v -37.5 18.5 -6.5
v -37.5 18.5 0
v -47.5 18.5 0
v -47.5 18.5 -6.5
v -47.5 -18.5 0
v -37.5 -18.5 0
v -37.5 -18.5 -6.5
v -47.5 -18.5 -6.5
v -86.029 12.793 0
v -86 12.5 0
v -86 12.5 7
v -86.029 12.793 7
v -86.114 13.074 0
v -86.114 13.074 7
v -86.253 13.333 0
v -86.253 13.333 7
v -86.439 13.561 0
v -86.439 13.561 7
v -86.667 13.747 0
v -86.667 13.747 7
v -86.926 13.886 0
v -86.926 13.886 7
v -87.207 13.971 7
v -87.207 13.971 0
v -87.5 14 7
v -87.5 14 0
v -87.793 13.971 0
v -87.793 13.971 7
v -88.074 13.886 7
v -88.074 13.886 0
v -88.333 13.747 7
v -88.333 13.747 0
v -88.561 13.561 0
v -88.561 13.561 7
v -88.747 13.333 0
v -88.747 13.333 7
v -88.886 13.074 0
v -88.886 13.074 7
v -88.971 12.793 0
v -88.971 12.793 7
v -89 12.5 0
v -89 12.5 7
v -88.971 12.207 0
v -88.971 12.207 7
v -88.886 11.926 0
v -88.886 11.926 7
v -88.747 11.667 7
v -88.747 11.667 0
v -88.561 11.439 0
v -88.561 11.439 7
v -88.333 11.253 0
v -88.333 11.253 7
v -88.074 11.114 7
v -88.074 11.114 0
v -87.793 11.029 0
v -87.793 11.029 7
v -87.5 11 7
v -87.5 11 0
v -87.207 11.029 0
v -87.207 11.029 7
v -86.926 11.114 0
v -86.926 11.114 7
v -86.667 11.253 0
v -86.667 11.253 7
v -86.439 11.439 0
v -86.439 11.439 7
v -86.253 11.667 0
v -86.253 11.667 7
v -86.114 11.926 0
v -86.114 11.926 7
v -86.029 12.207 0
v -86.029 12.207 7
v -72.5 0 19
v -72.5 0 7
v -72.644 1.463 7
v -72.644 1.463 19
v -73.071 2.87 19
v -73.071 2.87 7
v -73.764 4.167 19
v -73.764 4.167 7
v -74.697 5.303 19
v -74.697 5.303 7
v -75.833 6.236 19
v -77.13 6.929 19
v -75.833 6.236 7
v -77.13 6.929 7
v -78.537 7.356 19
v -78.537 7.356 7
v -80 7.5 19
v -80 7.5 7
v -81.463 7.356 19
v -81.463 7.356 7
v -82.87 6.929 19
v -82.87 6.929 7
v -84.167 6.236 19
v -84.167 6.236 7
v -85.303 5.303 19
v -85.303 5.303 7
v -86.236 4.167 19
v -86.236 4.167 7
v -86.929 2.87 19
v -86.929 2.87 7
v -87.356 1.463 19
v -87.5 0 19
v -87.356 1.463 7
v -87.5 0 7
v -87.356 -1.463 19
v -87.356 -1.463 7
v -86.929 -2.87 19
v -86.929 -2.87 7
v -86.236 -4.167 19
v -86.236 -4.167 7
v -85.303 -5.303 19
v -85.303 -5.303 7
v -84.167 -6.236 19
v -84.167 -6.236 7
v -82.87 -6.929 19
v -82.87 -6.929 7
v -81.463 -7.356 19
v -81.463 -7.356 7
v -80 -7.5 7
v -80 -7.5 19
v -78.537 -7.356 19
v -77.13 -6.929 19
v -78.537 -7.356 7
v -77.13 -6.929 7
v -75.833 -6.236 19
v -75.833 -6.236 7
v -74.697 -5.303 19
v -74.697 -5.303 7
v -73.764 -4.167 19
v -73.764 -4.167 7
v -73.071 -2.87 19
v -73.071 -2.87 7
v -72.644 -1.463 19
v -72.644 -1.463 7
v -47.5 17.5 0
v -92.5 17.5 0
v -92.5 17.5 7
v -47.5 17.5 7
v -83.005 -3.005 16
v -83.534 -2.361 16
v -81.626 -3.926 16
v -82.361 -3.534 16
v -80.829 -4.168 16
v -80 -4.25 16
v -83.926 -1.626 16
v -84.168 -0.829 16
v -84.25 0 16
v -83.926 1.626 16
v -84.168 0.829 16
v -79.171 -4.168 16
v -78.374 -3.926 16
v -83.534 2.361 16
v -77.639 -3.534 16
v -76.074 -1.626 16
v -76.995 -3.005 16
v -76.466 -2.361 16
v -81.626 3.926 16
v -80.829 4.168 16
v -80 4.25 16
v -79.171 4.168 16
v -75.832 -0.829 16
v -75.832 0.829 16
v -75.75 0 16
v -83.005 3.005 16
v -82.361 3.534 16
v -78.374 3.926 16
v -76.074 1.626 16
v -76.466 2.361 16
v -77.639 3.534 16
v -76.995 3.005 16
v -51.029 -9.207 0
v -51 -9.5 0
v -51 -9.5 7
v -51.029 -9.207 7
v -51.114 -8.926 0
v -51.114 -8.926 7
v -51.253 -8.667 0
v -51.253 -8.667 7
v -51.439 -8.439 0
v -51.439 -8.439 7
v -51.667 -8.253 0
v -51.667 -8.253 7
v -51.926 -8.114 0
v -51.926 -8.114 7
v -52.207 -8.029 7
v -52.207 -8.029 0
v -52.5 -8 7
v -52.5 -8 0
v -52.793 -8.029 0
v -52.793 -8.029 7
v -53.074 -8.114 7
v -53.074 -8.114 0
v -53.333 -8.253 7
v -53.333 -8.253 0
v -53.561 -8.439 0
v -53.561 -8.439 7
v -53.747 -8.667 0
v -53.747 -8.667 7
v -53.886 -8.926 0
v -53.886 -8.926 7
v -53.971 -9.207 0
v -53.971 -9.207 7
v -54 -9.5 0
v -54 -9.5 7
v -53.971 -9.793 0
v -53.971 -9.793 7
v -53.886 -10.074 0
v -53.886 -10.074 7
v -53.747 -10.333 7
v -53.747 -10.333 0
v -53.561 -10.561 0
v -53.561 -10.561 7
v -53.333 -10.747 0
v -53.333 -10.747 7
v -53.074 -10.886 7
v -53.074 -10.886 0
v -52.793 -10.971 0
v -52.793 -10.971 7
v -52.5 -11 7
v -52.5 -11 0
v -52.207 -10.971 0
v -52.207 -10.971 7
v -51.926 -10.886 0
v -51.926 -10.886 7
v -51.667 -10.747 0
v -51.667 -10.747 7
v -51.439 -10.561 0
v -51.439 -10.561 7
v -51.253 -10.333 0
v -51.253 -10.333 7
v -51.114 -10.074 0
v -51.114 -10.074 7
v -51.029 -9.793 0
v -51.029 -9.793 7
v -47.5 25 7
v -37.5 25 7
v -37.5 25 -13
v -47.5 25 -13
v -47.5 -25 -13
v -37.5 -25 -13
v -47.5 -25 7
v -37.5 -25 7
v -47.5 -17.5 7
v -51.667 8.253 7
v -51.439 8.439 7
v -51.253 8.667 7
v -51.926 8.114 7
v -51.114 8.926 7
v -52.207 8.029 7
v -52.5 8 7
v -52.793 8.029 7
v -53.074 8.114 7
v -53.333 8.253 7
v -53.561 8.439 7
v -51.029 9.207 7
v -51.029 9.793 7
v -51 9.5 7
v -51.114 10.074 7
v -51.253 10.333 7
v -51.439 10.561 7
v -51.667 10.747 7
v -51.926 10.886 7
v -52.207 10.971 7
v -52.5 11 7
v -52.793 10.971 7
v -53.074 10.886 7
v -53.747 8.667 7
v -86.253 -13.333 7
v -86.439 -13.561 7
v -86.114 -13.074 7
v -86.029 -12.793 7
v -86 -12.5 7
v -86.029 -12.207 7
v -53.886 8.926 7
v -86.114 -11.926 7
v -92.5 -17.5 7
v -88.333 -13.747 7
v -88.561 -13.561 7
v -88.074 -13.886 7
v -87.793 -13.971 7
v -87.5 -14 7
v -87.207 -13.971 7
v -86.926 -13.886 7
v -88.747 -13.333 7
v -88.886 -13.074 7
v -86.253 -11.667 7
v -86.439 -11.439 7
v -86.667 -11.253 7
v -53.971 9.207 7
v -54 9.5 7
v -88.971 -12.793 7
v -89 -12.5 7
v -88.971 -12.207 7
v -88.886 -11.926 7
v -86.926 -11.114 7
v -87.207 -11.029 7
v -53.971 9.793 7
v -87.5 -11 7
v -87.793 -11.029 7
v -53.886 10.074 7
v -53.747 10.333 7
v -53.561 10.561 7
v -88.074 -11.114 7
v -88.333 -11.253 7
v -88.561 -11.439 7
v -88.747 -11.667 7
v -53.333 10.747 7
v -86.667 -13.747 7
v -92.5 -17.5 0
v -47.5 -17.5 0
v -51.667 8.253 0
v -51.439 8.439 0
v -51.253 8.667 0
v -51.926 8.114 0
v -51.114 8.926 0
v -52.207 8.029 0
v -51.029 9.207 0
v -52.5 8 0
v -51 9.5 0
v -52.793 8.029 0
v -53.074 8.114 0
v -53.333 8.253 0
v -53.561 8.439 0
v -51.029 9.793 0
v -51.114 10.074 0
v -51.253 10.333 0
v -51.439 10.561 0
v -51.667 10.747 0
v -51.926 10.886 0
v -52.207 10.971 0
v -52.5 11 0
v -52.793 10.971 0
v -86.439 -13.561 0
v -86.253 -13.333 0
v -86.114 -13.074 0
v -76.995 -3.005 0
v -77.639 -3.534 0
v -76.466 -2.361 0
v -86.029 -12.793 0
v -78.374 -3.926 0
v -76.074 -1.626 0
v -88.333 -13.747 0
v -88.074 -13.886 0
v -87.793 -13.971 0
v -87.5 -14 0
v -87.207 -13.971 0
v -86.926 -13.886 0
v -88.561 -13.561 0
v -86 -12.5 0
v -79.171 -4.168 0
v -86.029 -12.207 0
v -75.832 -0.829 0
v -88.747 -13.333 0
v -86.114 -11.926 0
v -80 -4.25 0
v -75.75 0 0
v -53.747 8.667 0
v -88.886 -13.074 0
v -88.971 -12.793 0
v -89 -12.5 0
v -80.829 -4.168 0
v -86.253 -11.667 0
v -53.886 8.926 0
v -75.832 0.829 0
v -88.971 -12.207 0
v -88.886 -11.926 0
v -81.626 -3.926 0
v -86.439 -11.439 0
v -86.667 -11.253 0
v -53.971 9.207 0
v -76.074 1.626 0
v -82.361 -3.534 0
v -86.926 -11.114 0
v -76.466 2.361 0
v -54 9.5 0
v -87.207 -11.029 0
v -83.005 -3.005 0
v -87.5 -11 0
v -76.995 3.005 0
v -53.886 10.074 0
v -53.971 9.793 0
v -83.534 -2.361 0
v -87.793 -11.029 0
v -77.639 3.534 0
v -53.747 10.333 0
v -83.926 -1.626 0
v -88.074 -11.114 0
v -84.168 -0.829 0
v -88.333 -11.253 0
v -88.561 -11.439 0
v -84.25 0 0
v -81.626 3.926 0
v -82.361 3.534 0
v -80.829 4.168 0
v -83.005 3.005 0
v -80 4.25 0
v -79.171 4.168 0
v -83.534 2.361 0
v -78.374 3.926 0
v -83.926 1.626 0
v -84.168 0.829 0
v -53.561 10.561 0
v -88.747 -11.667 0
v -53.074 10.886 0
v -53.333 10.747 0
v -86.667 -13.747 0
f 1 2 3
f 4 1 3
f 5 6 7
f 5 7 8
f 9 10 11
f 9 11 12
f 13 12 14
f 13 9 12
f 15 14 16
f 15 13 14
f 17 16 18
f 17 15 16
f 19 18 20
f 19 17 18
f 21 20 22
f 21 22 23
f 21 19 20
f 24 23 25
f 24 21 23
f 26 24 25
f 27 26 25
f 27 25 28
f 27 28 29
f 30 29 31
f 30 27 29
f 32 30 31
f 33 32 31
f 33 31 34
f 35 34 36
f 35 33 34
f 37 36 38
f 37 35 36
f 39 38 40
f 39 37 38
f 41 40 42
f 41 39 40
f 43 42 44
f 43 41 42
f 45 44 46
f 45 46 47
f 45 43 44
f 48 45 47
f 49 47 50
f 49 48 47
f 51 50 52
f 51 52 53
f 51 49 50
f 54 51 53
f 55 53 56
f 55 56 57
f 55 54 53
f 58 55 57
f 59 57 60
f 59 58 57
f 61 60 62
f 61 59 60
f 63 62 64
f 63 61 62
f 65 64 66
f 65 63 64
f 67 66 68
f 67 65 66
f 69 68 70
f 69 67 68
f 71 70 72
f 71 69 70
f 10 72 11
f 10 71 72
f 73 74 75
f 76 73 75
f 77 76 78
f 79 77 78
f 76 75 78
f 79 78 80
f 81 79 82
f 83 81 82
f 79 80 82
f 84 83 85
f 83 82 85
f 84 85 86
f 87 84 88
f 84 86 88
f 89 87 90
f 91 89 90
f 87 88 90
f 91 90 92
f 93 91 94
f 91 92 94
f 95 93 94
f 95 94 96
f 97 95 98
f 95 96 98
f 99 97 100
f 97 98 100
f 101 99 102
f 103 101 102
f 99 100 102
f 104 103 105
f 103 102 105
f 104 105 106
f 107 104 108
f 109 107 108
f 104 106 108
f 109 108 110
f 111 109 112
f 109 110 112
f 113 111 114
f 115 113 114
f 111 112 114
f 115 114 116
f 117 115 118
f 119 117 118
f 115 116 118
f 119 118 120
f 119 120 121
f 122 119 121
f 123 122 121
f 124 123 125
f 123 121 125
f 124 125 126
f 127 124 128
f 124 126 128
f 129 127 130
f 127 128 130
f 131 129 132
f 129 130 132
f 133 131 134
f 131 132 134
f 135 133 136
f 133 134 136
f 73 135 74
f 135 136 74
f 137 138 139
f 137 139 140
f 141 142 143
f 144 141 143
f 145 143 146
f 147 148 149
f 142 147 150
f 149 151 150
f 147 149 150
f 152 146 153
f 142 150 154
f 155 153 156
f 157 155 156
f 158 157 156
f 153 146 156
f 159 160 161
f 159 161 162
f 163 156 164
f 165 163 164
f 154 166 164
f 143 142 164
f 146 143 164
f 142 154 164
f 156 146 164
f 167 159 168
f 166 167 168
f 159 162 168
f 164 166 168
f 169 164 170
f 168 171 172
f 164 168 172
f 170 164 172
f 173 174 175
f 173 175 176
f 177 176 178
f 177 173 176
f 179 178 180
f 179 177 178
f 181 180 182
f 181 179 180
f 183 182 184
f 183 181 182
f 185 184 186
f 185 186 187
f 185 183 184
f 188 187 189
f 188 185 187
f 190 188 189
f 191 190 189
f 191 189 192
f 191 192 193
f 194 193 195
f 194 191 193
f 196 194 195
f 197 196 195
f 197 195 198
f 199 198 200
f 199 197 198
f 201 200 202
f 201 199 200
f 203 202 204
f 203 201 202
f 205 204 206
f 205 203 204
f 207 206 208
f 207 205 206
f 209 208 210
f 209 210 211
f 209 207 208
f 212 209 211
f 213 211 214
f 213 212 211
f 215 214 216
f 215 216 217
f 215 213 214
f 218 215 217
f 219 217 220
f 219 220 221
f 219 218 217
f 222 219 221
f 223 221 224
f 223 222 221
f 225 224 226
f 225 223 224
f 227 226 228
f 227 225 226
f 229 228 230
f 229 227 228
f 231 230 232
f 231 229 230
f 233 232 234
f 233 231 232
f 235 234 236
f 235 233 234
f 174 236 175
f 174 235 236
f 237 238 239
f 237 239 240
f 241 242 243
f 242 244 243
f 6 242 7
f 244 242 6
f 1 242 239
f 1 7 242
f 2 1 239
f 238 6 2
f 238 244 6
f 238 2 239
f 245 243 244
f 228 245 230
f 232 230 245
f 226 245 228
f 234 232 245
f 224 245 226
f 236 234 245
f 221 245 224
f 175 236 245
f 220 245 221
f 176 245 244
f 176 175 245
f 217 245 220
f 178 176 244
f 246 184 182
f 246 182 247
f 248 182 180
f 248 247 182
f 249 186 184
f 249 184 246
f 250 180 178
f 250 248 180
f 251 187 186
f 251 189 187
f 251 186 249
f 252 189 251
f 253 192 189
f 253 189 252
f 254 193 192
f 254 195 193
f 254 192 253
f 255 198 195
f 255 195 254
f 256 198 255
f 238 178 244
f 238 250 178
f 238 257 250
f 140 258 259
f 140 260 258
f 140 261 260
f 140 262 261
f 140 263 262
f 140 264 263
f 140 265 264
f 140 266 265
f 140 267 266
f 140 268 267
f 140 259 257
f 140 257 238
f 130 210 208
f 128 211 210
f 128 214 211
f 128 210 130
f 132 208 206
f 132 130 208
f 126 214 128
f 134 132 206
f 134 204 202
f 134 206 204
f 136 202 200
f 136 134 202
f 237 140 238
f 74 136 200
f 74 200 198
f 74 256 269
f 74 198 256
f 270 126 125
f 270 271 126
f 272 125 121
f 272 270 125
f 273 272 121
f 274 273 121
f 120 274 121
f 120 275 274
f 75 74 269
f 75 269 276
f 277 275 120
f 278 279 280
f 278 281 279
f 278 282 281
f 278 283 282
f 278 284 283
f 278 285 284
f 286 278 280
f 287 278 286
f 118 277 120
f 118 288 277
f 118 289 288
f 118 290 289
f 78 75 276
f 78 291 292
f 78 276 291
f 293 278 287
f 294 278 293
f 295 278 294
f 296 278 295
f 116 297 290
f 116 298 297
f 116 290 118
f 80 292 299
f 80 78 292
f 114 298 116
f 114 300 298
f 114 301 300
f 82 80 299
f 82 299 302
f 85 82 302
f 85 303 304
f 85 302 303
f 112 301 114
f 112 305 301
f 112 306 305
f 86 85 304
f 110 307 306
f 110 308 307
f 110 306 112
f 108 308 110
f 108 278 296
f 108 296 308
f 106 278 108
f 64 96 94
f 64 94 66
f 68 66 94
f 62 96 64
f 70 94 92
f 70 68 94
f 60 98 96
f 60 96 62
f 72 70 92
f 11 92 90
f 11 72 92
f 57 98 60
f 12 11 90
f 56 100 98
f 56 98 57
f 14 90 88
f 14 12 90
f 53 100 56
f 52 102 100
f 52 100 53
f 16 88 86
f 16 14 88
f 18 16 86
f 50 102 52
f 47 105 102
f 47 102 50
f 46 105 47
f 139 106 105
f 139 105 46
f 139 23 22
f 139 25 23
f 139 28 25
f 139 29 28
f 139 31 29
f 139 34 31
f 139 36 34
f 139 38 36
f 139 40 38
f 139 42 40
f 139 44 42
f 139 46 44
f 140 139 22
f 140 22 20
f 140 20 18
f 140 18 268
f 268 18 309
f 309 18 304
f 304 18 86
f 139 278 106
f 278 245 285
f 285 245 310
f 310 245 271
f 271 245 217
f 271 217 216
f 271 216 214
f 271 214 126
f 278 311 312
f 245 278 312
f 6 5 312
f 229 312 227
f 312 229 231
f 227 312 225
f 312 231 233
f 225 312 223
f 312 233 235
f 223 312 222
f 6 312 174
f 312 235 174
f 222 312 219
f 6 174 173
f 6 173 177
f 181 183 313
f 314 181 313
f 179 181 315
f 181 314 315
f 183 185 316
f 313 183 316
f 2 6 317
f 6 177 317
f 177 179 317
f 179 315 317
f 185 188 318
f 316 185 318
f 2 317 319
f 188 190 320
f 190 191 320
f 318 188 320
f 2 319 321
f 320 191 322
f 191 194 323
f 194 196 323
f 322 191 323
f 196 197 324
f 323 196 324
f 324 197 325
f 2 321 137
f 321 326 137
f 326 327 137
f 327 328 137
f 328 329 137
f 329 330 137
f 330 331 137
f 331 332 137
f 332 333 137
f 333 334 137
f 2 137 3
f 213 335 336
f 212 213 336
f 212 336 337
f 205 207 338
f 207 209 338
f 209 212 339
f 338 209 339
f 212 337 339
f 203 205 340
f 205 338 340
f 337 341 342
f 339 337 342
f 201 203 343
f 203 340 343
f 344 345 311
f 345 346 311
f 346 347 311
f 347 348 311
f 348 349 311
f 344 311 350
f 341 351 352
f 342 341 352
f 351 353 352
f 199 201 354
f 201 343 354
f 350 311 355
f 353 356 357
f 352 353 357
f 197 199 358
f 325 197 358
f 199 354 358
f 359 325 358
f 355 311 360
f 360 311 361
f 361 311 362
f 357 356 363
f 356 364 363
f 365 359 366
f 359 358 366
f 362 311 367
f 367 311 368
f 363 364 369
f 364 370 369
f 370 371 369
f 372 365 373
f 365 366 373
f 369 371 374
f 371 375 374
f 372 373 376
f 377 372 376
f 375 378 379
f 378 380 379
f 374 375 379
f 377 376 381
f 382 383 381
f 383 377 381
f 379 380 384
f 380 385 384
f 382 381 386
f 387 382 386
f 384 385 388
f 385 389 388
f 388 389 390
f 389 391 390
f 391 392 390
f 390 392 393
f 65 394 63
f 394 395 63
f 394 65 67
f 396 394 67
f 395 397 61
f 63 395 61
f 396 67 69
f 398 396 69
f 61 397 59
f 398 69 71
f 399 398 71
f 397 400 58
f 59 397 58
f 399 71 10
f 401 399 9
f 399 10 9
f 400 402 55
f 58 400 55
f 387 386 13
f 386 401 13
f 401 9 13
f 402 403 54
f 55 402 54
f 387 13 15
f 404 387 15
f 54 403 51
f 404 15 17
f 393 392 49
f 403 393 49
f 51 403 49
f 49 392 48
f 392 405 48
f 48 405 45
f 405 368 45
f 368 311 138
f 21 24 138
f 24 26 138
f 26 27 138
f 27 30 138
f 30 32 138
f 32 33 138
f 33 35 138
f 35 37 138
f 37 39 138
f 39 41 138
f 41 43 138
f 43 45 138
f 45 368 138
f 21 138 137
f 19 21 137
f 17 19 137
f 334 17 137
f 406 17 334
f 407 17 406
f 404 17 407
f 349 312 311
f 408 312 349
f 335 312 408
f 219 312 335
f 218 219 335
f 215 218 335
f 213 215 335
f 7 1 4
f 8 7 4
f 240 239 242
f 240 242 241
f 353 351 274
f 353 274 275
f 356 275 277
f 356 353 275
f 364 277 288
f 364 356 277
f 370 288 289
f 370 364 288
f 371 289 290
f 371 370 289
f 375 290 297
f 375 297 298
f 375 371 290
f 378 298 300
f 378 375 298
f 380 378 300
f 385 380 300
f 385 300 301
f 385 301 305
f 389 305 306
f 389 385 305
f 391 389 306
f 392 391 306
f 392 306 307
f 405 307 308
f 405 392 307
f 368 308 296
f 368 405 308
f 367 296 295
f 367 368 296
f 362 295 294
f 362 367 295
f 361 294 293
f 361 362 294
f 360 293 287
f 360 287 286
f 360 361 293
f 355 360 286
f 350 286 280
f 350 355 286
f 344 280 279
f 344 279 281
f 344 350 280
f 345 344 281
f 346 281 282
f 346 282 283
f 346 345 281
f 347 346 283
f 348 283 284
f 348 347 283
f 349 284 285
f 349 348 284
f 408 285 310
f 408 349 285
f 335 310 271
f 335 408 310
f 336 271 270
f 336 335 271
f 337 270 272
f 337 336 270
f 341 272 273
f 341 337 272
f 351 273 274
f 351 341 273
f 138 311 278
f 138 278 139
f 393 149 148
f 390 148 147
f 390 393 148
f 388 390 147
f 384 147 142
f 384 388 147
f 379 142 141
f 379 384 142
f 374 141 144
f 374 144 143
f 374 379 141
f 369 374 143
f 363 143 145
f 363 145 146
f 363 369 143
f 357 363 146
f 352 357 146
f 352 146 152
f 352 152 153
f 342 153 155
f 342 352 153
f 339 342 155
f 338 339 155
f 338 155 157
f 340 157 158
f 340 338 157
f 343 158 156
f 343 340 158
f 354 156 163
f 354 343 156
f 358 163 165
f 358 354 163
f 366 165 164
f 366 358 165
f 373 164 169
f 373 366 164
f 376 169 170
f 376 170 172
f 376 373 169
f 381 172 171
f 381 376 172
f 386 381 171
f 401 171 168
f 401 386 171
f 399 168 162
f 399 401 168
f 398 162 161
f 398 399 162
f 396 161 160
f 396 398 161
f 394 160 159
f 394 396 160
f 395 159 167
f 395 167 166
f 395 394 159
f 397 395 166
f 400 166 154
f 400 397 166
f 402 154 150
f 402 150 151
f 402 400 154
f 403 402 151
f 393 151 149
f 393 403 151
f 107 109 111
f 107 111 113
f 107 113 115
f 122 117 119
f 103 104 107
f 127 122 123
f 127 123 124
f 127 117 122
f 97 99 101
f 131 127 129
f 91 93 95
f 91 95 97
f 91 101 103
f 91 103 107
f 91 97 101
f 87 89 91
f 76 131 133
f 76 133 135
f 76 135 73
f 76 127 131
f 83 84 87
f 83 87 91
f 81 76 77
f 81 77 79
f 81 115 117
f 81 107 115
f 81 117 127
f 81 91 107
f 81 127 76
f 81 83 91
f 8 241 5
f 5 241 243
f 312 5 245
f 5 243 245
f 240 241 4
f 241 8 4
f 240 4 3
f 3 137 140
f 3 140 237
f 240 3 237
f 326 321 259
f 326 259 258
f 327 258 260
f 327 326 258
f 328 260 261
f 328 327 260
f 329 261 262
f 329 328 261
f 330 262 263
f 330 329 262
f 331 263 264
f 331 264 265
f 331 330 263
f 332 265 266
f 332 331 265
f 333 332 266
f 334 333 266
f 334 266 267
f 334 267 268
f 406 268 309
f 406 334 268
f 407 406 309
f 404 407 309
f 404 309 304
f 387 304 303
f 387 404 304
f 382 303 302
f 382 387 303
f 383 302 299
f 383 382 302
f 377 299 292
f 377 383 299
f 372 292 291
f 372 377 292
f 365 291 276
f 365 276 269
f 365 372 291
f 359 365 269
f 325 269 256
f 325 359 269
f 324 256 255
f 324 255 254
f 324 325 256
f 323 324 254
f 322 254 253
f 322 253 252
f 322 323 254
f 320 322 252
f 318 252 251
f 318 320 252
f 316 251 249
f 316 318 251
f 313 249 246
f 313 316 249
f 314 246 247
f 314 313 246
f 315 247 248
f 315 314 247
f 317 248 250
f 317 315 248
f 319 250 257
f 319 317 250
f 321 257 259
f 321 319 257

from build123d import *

# Parameters (mm, degrees)
SKETCH1_R           = 1.5
BOSS_EXTRUDE1_DEPTH = 7
SKETCH2_W           = 7
SKETCH2_H           = 50
BOSS_EXTRUDE2_DEPTH = 10
SKETCH3_W           = 10
SKETCH3_H           = 6.5
BOSS_EXTRUDE3_DEPTH = 6.5
SKETCH4_W           = 10
SKETCH4_H           = 50
BOSS_EXTRUDE4_DEPTH = 6.5
SKETCH5_R           = 7.5
BOSS_EXTRUDE5_DEPTH = 12
SKETCH1_3_R         = 4.25
CUT_EXTRUDE1_DEPTH  = 16


with BuildPart() as part:
    # Sketch1 → Boss-Extrude1 (new body)
    with BuildSketch(Plane.XY):
        Polygon((-47.5, 17.5), (-92.5, 17.5), (-92.5, 0), (-92.5, -17.5), (-47.5, -17.5), align=None)
        with Locations((-87.5, -12.5)):
            Circle(SKETCH1_R, mode=Mode.SUBTRACT)
        with Locations((-52.5, -9.5)):
            Circle(SKETCH1_R, mode=Mode.SUBTRACT)
        with Locations((-87.5, 12.5)):
            Circle(SKETCH1_R, mode=Mode.SUBTRACT)
        with Locations((-52.5, 9.5)):
            Circle(SKETCH1_R, mode=Mode.SUBTRACT)
    extrude(amount=BOSS_EXTRUDE1_DEPTH)

    # Sketch2 → Boss-Extrude2 (add)
    with BuildSketch(Plane(origin=(-47.5, 0, 0), x_dir=(0, 0, -1), z_dir=(1, 0, 0))):
        with Locations((-3.5, 0)):
            Rectangle(SKETCH2_W, SKETCH2_H)
    extrude(amount=BOSS_EXTRUDE2_DEPTH)

    # Sketch3 → Boss-Extrude3 (add)
    with BuildSketch(Plane(origin=(0, 0, 0), x_dir=(-1, 0, 0), z_dir=(0, 0, -1))):
        with Locations((42.5, 21.75)):
            Rectangle(SKETCH3_W, SKETCH3_H)
        with Locations((42.5, -21.75)):
            Rectangle(SKETCH3_W, SKETCH3_H)
    extrude(amount=BOSS_EXTRUDE3_DEPTH)

    # Sketch4 → Boss-Extrude4 (add)
    with BuildSketch(Plane(origin=(0, 0, -6.5), x_dir=(-1, 0, 0), z_dir=(0, 0, -1))):
        with Locations((42.5, 0)):
            Rectangle(SKETCH4_W, SKETCH4_H)
    extrude(amount=BOSS_EXTRUDE4_DEPTH)

    # Sketch5 → Boss-Extrude5 (add)
    with BuildSketch(Plane.XY.offset(7)):
        with Locations((-80, 0)):
            Circle(SKETCH5_R)
    extrude(amount=BOSS_EXTRUDE5_DEPTH)

    # Sketch1<3> → Cut-Extrude1 (cut)
    with BuildSketch(Plane.XY):
        with Locations((-80, 0)):
            Circle(SKETCH1_3_R)
    extrude(amount=CUT_EXTRUDE1_DEPTH, mode=Mode.SUBTRACT)


solid = part.part
